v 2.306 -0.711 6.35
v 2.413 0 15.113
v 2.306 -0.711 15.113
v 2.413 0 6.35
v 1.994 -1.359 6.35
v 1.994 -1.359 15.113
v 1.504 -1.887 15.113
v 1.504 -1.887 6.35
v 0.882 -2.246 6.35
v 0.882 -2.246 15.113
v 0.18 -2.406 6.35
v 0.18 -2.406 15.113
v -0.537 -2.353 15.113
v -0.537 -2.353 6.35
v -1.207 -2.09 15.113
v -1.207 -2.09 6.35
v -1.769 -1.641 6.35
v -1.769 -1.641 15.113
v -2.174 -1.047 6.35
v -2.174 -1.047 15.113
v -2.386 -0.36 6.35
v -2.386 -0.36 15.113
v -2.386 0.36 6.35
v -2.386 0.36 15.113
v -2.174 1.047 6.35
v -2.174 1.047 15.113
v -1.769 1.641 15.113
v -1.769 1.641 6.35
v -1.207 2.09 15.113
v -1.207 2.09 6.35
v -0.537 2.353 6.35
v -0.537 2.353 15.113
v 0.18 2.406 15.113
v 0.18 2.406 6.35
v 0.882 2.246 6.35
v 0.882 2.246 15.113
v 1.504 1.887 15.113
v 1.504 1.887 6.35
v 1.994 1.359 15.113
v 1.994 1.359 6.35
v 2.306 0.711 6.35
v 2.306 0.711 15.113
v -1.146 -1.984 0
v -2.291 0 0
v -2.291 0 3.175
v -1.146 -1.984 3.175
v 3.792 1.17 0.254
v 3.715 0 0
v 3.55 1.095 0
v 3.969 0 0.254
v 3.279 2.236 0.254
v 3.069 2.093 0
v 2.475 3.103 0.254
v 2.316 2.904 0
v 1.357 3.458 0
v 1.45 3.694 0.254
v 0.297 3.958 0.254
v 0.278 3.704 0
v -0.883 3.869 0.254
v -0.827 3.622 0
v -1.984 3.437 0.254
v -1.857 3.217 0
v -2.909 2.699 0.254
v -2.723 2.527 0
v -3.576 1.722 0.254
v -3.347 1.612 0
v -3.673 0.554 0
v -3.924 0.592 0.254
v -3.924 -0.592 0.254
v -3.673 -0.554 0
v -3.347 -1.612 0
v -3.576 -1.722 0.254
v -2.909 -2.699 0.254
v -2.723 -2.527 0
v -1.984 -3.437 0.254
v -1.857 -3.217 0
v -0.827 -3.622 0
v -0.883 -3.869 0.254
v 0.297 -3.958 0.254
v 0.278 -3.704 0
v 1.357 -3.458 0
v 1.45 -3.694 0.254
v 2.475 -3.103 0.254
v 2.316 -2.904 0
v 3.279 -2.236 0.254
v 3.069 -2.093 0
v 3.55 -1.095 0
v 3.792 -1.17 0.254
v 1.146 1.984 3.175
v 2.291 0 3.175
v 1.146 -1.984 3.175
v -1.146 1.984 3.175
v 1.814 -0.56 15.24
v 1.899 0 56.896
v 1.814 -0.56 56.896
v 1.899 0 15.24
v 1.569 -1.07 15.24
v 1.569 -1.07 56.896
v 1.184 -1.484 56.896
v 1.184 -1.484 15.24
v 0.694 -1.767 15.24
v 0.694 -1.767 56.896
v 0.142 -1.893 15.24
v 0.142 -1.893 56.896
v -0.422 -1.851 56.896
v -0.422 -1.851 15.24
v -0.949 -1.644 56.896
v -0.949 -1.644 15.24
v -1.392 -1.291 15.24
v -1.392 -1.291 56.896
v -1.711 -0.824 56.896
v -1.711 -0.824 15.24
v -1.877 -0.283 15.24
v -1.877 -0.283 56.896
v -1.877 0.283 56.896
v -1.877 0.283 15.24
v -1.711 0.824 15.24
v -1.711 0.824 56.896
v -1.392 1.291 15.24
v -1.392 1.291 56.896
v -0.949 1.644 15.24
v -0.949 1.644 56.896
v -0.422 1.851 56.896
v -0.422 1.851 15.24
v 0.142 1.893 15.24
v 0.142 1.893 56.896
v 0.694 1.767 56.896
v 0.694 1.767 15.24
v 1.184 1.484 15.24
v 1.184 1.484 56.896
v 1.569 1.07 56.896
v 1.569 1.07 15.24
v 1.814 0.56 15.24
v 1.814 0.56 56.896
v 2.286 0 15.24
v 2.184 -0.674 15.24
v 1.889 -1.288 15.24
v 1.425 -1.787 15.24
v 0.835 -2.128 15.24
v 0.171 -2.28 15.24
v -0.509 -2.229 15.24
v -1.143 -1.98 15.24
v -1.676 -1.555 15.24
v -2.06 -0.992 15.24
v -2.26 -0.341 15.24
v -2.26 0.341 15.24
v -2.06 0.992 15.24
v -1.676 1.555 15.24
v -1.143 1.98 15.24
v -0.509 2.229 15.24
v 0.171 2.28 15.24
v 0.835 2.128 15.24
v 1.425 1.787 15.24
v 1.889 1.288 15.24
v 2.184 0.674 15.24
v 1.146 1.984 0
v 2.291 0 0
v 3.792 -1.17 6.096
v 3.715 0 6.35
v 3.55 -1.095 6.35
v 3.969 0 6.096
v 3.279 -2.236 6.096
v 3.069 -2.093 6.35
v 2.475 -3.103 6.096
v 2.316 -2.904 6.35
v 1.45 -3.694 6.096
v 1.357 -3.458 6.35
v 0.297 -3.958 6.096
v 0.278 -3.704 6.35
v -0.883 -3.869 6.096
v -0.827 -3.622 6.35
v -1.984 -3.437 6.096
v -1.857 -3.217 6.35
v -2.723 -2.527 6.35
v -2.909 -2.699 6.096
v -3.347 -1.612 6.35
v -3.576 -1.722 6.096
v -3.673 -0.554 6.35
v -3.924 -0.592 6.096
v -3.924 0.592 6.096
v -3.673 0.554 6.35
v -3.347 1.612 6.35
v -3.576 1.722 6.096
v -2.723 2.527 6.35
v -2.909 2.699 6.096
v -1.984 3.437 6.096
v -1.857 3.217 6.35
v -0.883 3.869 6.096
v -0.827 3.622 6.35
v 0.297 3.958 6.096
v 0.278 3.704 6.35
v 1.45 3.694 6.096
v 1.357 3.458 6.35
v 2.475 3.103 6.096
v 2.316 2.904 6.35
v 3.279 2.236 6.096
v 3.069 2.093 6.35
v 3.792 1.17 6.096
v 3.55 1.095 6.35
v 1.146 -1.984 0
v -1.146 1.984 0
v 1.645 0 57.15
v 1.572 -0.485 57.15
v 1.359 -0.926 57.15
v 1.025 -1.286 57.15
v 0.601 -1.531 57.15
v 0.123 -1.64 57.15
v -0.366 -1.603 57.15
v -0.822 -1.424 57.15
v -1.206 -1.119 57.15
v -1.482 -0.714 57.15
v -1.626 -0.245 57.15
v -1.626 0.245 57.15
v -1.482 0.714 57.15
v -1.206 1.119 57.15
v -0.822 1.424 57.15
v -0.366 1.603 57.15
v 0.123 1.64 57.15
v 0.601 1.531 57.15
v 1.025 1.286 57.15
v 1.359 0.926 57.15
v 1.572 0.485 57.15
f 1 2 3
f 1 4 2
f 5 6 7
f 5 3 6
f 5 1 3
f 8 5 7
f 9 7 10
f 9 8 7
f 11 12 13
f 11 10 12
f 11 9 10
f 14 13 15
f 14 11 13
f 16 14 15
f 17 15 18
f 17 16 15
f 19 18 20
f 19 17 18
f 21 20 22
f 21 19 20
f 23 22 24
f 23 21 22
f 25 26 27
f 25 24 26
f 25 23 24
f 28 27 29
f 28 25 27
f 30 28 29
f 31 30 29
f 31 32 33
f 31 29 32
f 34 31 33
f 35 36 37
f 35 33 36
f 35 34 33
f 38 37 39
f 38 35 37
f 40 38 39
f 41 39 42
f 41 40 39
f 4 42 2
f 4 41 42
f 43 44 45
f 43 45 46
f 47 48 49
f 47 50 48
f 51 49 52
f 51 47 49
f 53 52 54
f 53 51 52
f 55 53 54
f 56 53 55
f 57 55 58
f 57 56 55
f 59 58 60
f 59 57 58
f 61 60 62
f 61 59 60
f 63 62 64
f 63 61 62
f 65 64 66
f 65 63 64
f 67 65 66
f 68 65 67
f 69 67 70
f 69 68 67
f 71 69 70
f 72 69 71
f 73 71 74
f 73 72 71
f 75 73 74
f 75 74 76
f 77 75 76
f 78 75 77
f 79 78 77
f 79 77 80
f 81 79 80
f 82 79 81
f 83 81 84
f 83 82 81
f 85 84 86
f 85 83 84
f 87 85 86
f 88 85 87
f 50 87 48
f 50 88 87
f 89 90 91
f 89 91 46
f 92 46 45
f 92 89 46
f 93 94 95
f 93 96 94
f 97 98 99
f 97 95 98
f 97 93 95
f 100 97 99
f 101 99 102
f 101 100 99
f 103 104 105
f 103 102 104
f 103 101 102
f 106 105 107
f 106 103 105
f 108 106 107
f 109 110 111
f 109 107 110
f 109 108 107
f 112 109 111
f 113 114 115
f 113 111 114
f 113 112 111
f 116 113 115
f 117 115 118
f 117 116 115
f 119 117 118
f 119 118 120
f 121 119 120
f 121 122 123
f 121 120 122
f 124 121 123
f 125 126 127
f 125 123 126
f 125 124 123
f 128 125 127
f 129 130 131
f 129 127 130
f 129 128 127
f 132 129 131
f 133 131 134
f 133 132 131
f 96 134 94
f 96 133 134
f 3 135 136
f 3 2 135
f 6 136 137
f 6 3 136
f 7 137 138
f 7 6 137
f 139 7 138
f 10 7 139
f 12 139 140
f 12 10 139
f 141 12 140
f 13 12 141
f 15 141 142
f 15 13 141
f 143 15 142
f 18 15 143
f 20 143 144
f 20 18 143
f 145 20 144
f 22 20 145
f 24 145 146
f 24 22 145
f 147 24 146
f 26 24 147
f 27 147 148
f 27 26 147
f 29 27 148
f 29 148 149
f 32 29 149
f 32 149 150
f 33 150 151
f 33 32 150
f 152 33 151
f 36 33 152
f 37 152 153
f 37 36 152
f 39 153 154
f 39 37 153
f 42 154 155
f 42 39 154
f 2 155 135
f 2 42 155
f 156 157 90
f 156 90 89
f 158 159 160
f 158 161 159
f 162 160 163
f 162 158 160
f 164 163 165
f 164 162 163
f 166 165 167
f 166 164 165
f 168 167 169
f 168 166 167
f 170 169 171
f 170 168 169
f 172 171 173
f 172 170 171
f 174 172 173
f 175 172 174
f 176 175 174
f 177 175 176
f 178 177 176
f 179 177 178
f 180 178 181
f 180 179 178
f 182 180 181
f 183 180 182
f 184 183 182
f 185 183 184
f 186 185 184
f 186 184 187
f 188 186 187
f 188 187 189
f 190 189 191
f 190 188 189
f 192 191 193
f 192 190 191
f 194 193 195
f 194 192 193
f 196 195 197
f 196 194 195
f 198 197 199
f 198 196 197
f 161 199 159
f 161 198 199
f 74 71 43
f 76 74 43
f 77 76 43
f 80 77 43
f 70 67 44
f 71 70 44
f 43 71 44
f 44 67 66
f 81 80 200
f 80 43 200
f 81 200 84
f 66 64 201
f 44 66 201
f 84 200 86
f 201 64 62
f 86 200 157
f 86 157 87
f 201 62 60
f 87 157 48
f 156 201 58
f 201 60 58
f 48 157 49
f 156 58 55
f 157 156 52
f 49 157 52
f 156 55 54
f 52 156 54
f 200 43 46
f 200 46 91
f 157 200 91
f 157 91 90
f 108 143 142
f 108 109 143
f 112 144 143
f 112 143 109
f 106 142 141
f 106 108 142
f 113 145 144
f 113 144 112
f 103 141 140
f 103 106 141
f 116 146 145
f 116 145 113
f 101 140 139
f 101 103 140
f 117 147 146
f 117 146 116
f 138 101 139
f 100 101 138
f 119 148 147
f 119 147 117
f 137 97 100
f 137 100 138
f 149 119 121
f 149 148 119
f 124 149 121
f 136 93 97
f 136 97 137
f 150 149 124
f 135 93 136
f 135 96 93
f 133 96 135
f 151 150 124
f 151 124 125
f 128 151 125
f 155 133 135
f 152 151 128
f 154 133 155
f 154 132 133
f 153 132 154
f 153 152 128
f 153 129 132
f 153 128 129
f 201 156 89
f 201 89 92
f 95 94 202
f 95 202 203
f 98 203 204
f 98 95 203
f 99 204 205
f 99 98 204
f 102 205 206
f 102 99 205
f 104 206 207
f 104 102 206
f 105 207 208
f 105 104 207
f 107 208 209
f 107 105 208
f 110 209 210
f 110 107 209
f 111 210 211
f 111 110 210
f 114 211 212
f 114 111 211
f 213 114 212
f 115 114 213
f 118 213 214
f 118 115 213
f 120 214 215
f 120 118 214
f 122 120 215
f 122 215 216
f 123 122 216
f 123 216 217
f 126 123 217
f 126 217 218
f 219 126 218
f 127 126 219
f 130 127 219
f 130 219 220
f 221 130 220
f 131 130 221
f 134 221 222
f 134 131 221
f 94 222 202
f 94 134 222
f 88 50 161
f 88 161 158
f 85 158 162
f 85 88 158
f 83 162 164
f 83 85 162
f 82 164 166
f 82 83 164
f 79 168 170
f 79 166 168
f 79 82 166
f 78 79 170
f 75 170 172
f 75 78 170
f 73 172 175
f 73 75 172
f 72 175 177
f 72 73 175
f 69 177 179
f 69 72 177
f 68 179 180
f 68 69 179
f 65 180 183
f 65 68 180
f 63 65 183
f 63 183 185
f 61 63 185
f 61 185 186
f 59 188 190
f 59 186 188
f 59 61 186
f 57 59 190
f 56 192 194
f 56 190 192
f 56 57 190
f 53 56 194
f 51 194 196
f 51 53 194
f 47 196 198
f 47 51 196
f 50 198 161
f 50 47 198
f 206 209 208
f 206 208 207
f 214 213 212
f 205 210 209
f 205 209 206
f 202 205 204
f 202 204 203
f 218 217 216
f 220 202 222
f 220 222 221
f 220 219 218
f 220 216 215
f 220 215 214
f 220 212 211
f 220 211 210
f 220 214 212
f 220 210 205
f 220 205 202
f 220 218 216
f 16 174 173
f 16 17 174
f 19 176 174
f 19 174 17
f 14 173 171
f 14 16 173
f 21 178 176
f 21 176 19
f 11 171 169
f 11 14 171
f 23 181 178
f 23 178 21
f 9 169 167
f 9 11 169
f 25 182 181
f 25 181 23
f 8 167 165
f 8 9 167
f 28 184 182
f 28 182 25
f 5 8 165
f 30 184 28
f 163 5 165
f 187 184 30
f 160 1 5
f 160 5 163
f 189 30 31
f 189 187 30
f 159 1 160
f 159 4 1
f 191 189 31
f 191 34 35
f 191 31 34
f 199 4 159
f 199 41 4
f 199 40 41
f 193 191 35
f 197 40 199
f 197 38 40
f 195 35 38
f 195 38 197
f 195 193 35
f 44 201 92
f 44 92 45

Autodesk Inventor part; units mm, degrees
ref_plane "YZ Plane" through (0, 0, 0) normal (1, 0, 0) x (0, 1, 0)
ref_plane "XZ Plane" through (0, 0, 0) normal (0, 1, 0) x (-1, 0, 0)
ref_plane "XY Plane" through (0, 0, 0) normal (0, 0, 1) x (1, 0, 0)
sketch "Sketch1" plane through (0, 0, 0) normal (0, 0, 1) x (1, 0, 0)
  circle A0 centre (0, 0) radius 3.9688
  dimension "d0" = 7.9375
extrude "Extrusion1" add sketch "Sketch1" along normal blind 6.35
sketch "Sketch2" plane through (0, 0, 6.35) normal (0, 0, 1) x (1, 0, 0)
  circle A0 centre (0, 0) radius 3.9688 projected
  circle A1 centre (0, 0) radius 2.413
  dimension "d4" = 4.826
extrude "Extrusion2" add sketch "Sketch2" along normal blind 8.89 contours A1
thread "Thread1" size "10-32 UNF" class "2A" standard "ANSI Unified Screw Threads" full length
sketch "Sketch3" plane through (0, 0, 15.24) normal (0, 0, 1) x (1, 0, 0)
  circle A0 centre (0, 0) radius 2.413 projected
  circle A1 centre (0, 0) radius 1.8986
  dimension "d17" = 3.7973
extrude "Extrusion3" add sketch "Sketch3" along normal blind 41.91 contours A1
sketch "Sketch4" plane through (0, 0, 0) normal (0, 0, -1) x (-1, 0, 0)
  circle A0 centre (0, 0) radius 3.9688 projected
  line L0 (-2.2914, 0) -> (-1.1457, 1.9844)
  line L1 (-1.1457, 1.9844) -> (1.1457, 1.9844)
  line L2 (1.1457, 1.9844) -> (2.2914, 0)
  line L3 (2.2914, 0) -> (1.1457, -1.9844)
  line L4 (1.1457, -1.9844) -> (-1.1457, -1.9844)
  line L5 (-1.1457, -1.9844) -> (-2.2914, 0)
  dimension "d23" = 3.9688
extrude "Extrusion4" cut sketch "Sketch4" against normal blind 3.175 contours L0 L1 L2 L3 L4 L5
chamfer "Chamfer1" distance 0.254 angle 45 3 edges at (-3.9688, 0, 0) (-3.9688, 0, 6.35) (-1.8986, 0, 57.15)
chamfer "Chamfer2" distance 0.127 angle 45 1 edges at (-2.413, 0, 15.24)
properties part number "Rod Bolt Side"
